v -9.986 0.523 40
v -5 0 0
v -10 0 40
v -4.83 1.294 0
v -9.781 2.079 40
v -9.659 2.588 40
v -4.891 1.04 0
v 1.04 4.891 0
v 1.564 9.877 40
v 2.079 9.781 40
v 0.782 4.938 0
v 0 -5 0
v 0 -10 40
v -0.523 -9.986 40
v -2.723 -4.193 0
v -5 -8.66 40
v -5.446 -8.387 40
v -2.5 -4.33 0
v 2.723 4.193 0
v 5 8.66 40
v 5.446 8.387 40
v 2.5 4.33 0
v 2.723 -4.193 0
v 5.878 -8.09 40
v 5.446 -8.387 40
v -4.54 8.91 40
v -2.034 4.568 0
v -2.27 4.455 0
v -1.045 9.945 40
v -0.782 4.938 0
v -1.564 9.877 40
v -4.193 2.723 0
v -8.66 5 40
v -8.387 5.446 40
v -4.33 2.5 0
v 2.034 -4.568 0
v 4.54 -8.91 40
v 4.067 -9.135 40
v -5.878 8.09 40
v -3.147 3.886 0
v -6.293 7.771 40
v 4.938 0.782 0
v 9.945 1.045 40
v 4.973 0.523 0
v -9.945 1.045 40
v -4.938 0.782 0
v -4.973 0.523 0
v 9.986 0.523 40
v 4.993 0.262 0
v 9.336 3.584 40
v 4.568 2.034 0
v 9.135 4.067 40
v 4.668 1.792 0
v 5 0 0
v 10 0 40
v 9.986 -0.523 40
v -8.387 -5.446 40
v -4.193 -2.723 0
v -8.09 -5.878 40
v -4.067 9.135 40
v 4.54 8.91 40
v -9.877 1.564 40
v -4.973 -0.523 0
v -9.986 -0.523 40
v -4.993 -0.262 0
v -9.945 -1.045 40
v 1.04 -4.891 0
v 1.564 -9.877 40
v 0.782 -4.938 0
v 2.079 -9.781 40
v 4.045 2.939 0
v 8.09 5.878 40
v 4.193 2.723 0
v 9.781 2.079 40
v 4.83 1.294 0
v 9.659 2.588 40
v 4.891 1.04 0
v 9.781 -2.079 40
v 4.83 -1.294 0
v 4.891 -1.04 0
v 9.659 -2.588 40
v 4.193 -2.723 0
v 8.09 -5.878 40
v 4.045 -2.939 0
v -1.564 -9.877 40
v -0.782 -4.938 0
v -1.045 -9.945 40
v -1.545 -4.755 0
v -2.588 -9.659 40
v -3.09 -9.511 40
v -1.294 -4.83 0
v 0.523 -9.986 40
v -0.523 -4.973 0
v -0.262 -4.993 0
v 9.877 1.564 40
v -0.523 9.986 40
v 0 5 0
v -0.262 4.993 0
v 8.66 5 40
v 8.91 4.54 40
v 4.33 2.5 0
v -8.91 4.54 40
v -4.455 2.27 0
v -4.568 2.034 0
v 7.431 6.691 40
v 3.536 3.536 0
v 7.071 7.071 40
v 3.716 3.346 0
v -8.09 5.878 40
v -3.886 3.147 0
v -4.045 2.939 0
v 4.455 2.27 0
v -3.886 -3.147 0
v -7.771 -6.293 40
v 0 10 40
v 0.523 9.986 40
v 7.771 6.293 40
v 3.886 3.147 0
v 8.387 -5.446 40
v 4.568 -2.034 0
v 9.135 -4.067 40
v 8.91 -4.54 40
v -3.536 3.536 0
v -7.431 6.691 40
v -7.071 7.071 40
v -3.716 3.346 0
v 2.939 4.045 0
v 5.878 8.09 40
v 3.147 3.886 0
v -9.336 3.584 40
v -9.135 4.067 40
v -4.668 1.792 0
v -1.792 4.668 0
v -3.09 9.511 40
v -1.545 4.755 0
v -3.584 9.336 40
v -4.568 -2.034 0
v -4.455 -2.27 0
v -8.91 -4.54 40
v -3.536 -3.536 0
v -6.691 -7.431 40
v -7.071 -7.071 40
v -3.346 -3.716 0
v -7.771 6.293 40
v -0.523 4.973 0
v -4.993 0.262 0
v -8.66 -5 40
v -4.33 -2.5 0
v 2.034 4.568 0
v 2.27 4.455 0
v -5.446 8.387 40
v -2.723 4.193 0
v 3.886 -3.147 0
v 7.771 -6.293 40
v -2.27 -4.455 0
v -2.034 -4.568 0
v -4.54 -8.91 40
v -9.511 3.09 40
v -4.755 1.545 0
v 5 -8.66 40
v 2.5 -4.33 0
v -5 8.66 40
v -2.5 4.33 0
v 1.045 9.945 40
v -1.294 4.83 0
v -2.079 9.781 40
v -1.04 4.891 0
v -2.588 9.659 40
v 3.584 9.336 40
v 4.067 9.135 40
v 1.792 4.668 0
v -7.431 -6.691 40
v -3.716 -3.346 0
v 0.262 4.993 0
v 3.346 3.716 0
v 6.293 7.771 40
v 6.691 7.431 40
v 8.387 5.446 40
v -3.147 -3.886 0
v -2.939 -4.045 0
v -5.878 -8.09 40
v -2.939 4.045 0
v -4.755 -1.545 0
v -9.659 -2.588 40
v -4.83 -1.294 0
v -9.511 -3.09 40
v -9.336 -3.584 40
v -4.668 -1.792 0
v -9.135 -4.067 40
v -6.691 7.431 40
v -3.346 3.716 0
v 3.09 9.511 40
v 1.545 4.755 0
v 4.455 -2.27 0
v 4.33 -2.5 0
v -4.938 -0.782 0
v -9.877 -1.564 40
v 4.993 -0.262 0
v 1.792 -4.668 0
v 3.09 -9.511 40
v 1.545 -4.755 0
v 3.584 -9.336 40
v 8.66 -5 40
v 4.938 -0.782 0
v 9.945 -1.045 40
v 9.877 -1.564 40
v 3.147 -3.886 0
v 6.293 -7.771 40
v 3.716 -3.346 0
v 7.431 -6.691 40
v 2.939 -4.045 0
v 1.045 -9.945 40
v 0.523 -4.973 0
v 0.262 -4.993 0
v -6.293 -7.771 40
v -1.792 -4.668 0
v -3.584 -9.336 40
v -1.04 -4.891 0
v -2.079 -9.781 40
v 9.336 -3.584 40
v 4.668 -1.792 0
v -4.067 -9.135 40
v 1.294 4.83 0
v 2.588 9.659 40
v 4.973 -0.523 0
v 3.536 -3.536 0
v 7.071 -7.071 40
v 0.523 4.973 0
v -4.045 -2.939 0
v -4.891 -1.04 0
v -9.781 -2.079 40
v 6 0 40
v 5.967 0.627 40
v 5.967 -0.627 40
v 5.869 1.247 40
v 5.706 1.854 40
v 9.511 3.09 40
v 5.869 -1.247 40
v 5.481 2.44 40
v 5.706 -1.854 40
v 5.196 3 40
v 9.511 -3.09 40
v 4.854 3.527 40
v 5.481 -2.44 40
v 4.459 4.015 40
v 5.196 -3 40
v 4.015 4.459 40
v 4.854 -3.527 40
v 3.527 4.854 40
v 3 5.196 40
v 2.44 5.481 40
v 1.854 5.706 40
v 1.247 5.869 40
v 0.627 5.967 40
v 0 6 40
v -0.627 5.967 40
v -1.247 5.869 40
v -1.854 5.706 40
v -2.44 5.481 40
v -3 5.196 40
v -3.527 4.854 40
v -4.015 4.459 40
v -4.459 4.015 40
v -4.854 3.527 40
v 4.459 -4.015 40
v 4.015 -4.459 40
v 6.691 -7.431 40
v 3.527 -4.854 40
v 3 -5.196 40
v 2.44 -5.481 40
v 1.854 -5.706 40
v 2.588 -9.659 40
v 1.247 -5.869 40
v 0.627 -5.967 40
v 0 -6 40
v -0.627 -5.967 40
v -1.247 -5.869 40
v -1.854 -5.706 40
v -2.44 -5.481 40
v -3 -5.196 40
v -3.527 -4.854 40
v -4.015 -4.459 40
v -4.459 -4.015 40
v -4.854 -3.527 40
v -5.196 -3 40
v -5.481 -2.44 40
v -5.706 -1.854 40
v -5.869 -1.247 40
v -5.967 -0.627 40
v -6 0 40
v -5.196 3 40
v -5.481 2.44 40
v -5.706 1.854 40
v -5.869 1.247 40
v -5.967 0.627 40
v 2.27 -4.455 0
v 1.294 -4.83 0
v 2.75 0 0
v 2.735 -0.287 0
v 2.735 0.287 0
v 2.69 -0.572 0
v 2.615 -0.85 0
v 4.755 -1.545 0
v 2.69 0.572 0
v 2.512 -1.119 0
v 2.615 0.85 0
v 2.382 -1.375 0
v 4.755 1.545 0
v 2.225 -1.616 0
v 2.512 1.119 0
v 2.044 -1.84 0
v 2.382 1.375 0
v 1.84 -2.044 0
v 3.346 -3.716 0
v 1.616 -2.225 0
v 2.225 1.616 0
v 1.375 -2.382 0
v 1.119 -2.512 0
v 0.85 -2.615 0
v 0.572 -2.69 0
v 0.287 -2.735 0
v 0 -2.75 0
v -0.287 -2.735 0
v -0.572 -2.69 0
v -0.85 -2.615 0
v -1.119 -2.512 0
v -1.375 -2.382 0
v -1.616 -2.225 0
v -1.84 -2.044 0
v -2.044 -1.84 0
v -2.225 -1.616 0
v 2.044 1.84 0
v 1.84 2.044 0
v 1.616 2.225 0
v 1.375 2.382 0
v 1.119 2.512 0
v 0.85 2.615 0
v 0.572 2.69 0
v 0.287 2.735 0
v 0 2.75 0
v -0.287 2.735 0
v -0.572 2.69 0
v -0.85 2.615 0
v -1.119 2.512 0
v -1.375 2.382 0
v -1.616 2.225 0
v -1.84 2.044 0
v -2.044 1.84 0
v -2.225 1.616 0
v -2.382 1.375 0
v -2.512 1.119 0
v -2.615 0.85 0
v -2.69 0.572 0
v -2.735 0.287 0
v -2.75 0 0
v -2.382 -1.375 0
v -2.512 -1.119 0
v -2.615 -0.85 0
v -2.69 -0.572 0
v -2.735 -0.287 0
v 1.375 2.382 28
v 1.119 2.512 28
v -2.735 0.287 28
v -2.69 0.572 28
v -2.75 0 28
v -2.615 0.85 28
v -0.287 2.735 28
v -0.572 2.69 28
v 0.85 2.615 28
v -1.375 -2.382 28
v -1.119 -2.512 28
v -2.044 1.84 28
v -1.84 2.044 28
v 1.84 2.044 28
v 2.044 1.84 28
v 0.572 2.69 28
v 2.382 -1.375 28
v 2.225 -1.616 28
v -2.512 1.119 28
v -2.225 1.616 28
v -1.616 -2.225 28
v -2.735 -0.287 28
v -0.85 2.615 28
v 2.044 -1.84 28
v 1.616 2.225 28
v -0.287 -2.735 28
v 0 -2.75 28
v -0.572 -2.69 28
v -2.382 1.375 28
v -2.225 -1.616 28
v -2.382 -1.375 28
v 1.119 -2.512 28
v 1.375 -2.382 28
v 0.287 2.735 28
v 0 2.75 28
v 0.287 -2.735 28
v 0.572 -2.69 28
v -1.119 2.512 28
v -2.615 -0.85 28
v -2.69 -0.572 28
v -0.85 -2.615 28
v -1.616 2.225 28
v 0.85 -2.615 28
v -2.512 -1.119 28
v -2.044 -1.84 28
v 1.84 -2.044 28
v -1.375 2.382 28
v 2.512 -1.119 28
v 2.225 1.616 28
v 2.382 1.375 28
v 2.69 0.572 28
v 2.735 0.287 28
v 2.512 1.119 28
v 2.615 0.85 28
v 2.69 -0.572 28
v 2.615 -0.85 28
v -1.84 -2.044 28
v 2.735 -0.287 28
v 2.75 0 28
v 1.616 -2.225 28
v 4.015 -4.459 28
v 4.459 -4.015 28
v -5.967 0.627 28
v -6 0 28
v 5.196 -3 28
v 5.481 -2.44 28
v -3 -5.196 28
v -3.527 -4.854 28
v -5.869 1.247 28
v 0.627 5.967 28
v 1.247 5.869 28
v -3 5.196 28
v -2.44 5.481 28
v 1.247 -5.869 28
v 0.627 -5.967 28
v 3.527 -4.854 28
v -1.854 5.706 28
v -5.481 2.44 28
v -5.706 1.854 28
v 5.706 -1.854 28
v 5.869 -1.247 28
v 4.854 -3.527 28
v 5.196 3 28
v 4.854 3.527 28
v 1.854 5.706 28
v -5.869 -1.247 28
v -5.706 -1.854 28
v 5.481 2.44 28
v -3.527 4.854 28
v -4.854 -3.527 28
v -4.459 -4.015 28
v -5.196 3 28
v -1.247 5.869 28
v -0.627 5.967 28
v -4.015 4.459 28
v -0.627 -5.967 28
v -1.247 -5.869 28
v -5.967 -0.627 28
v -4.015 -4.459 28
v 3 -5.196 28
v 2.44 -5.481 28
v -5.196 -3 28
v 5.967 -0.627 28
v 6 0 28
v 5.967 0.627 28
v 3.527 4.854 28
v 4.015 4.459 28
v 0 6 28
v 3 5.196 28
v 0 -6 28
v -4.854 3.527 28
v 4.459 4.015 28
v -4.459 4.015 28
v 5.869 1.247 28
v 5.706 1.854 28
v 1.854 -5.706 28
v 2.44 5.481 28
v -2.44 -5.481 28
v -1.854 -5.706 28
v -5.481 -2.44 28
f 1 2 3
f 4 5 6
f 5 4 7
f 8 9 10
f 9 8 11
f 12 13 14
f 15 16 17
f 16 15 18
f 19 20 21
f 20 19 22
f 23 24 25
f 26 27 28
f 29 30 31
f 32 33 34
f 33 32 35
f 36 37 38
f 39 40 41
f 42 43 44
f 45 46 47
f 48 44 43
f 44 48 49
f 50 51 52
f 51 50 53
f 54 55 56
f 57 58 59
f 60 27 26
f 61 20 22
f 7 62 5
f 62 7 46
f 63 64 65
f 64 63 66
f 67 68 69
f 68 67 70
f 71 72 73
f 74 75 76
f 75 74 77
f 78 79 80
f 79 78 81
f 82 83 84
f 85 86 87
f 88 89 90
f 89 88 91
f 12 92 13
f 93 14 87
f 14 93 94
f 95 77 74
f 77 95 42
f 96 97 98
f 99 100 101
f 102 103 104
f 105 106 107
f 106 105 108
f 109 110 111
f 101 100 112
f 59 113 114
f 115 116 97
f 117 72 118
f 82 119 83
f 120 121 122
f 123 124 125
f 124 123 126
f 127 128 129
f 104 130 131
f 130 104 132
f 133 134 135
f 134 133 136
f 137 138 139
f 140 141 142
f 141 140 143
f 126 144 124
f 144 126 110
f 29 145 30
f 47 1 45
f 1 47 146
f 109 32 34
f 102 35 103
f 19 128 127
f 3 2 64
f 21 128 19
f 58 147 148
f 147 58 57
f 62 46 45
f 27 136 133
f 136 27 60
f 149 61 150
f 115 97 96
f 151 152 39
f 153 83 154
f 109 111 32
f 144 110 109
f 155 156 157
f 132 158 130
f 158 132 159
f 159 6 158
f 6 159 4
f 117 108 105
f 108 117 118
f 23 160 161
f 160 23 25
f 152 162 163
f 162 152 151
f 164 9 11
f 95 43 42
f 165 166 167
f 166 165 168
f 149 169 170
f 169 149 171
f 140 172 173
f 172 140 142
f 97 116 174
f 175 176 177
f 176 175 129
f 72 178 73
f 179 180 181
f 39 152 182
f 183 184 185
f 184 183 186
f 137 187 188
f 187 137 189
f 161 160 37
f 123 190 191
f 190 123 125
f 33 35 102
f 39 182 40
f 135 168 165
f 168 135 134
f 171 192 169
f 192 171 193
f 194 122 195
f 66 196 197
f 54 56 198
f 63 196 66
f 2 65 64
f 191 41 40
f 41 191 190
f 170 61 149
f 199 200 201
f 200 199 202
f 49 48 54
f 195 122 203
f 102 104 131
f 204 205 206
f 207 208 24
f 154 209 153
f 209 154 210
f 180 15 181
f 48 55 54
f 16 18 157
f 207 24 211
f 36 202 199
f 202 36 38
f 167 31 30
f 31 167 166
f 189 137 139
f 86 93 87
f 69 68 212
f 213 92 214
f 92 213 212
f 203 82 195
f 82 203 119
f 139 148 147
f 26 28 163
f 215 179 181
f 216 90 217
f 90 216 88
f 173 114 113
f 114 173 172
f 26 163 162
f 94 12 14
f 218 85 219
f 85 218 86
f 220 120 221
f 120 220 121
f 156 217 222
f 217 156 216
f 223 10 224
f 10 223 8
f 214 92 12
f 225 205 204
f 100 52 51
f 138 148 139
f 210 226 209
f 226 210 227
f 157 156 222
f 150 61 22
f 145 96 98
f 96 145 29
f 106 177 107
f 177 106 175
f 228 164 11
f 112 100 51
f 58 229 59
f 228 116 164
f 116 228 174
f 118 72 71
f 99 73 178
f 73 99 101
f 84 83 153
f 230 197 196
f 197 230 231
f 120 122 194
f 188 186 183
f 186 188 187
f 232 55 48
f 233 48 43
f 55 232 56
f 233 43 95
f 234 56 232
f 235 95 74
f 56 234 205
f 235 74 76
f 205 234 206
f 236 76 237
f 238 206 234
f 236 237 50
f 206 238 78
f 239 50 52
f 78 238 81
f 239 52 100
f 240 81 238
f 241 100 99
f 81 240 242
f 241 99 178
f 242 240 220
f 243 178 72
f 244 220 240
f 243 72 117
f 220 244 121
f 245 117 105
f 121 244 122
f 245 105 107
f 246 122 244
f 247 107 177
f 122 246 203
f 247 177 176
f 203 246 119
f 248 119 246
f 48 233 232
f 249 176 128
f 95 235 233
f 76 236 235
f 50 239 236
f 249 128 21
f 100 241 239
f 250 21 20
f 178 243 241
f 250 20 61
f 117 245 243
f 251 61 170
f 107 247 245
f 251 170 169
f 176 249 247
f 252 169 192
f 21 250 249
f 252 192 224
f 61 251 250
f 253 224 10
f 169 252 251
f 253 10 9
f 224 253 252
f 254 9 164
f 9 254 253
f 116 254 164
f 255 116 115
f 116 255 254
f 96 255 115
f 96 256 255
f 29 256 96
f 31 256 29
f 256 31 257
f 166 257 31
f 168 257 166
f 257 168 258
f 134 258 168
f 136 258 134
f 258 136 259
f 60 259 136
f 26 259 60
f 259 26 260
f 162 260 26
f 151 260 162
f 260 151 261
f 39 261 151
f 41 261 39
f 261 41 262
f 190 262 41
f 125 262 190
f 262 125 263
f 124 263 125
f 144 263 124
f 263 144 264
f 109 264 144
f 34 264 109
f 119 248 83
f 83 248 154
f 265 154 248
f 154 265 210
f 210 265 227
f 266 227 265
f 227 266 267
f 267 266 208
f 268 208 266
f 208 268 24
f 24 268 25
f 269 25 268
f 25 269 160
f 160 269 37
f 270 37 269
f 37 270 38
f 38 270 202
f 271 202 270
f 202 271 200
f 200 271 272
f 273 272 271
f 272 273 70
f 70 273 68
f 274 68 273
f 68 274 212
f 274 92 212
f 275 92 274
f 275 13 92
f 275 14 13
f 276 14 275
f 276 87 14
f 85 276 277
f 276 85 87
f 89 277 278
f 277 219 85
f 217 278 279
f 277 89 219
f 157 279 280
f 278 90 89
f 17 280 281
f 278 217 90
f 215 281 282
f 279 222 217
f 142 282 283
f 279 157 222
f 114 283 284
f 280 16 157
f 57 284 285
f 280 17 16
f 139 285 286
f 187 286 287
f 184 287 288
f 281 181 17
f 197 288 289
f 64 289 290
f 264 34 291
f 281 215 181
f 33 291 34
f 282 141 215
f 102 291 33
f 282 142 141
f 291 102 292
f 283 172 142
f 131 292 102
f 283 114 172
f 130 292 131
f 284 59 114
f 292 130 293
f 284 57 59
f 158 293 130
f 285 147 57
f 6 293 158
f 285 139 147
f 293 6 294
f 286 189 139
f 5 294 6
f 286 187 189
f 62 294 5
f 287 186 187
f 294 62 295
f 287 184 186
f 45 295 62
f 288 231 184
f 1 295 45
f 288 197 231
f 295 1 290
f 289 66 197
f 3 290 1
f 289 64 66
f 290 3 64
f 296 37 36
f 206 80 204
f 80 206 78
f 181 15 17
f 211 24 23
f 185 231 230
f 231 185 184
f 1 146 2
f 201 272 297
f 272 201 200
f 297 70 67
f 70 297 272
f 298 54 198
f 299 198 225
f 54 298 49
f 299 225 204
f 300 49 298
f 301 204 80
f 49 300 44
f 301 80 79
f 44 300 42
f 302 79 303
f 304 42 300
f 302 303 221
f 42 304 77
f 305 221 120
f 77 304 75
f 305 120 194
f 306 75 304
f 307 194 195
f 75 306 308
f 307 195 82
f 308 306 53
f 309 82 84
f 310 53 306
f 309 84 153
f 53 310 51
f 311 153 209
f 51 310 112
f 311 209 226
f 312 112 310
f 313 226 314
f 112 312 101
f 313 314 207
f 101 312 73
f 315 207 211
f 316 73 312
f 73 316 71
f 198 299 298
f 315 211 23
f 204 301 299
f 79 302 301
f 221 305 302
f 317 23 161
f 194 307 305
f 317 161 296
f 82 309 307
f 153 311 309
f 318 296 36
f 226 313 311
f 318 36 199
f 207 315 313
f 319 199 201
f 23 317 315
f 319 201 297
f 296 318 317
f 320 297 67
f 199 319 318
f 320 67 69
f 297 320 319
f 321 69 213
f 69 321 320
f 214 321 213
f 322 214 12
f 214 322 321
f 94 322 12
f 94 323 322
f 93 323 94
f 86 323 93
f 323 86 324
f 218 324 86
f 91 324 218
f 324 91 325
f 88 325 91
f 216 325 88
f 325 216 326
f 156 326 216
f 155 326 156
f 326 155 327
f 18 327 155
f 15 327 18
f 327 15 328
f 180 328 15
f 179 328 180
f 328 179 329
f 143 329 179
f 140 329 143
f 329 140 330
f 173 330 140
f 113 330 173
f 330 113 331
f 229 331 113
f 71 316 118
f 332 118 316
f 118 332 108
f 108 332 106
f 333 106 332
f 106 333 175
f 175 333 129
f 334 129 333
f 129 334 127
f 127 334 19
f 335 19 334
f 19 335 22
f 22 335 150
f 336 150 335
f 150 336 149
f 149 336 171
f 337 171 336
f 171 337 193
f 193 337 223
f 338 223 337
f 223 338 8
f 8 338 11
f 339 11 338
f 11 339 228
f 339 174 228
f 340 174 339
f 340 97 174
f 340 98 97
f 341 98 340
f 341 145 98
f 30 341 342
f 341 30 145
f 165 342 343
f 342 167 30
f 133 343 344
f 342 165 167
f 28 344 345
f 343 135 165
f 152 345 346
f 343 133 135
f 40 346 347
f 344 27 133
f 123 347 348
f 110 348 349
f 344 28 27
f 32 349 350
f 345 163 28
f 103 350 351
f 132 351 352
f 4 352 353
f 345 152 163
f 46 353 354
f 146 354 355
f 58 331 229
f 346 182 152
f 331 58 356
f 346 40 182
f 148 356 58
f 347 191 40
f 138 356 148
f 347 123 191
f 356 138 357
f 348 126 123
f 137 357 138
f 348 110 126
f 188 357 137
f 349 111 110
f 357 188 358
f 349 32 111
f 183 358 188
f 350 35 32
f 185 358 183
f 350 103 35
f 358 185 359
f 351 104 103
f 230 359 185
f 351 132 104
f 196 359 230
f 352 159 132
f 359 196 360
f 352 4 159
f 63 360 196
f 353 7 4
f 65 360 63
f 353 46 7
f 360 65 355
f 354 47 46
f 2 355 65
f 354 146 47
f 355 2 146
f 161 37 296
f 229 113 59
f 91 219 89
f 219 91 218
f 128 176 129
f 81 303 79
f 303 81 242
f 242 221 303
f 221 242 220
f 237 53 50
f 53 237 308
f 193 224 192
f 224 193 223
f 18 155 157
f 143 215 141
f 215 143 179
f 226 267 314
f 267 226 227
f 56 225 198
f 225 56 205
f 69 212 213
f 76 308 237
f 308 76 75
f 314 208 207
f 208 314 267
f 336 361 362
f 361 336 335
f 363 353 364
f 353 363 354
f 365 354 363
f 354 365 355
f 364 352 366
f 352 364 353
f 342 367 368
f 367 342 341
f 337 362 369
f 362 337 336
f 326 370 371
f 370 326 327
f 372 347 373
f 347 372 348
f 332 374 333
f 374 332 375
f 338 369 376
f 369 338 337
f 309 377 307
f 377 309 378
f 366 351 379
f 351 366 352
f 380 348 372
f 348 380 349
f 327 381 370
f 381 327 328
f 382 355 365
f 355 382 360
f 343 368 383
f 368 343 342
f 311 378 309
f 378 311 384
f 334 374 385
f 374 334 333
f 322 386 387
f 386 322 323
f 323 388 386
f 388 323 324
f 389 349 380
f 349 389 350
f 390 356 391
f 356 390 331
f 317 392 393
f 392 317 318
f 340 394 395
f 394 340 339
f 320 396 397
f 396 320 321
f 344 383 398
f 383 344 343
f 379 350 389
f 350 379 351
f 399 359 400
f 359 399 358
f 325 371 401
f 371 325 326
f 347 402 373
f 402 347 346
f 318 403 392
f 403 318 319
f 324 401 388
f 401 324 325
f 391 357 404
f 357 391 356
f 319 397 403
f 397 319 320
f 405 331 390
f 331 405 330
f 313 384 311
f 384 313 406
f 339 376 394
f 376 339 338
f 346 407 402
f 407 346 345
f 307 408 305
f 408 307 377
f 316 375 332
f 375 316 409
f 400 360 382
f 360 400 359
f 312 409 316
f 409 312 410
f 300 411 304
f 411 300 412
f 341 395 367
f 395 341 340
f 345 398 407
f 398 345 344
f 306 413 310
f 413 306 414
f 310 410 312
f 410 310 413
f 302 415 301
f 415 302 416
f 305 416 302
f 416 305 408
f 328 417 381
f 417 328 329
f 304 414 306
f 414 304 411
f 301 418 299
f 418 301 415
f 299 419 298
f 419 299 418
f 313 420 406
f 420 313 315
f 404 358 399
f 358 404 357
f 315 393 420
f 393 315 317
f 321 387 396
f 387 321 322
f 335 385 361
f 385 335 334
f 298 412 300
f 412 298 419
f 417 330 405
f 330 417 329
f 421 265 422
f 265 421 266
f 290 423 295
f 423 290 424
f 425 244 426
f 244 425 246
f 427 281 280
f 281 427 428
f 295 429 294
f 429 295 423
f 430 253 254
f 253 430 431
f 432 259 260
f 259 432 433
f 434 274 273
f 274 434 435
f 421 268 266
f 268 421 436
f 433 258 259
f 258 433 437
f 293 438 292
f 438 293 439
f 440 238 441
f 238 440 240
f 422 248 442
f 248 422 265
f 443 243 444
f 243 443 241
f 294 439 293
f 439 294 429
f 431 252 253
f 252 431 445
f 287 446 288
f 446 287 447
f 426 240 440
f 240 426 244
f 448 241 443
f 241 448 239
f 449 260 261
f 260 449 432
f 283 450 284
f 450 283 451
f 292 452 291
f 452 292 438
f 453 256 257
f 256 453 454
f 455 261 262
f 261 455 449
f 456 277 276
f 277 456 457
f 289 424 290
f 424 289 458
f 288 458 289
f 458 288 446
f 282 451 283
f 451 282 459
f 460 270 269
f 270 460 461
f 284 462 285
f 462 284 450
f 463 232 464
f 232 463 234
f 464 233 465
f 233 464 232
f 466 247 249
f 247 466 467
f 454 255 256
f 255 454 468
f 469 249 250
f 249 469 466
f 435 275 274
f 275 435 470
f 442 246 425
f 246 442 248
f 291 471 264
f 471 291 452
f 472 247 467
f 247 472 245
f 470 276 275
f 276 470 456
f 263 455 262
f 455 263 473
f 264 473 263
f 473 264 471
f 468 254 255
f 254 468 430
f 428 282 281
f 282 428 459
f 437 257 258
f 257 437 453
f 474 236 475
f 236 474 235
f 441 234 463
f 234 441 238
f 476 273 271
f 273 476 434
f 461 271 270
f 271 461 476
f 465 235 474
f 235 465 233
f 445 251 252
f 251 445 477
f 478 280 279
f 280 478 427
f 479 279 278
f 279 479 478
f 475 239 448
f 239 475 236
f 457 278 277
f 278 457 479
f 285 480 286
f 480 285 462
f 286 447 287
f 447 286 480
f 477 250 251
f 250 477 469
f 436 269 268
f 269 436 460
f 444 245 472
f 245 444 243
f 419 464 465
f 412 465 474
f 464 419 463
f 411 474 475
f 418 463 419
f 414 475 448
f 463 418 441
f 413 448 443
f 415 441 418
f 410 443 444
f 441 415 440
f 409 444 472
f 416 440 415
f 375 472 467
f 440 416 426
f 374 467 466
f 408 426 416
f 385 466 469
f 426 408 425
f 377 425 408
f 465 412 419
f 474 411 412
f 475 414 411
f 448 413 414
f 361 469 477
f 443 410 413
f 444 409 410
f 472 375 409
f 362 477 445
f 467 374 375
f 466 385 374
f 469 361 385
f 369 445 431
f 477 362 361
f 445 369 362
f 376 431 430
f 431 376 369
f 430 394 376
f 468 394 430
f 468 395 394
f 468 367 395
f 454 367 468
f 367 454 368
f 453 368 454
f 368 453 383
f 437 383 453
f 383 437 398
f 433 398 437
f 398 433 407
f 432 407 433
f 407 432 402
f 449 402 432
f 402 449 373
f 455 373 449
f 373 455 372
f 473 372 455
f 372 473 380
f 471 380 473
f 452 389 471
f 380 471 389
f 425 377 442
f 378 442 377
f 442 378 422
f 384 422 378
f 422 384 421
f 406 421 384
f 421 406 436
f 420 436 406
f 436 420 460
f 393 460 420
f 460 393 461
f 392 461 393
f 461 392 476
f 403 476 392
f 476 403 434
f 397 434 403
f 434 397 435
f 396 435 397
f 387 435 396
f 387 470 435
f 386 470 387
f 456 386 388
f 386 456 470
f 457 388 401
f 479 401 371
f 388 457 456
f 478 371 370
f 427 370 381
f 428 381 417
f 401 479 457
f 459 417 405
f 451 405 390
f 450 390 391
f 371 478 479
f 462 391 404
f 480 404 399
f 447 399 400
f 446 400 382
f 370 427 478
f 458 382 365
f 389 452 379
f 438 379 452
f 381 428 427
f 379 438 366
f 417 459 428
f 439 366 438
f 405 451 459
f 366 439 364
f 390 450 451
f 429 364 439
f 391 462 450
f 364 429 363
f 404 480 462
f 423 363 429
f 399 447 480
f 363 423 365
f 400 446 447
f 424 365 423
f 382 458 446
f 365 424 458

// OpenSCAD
total_height = 40; // mm
rope_diameter = 5; // mm
knot_diameter = 10; // mm


// rotation puts it into netgative space, fix that.
translate([0, 0, total_height]) {
  // Rotate it so that it can be printed without supports.
  rotate([0, 180, 0]) {
    difference() {
      // main cone
      cylinder(d1=rope_diameter * 4, d2=(rope_diameter * 2), h=total_height, $fn=120);

      // cut a hole for the rope
      cylinder(d=rope_diameter + 0.5, h=total_height, $fn=60);

      // cut a hole for the knot
      cylinder(d=knot_diameter + 2, h=knot_diameter + 2, $fn=60);
    }
  }
}
